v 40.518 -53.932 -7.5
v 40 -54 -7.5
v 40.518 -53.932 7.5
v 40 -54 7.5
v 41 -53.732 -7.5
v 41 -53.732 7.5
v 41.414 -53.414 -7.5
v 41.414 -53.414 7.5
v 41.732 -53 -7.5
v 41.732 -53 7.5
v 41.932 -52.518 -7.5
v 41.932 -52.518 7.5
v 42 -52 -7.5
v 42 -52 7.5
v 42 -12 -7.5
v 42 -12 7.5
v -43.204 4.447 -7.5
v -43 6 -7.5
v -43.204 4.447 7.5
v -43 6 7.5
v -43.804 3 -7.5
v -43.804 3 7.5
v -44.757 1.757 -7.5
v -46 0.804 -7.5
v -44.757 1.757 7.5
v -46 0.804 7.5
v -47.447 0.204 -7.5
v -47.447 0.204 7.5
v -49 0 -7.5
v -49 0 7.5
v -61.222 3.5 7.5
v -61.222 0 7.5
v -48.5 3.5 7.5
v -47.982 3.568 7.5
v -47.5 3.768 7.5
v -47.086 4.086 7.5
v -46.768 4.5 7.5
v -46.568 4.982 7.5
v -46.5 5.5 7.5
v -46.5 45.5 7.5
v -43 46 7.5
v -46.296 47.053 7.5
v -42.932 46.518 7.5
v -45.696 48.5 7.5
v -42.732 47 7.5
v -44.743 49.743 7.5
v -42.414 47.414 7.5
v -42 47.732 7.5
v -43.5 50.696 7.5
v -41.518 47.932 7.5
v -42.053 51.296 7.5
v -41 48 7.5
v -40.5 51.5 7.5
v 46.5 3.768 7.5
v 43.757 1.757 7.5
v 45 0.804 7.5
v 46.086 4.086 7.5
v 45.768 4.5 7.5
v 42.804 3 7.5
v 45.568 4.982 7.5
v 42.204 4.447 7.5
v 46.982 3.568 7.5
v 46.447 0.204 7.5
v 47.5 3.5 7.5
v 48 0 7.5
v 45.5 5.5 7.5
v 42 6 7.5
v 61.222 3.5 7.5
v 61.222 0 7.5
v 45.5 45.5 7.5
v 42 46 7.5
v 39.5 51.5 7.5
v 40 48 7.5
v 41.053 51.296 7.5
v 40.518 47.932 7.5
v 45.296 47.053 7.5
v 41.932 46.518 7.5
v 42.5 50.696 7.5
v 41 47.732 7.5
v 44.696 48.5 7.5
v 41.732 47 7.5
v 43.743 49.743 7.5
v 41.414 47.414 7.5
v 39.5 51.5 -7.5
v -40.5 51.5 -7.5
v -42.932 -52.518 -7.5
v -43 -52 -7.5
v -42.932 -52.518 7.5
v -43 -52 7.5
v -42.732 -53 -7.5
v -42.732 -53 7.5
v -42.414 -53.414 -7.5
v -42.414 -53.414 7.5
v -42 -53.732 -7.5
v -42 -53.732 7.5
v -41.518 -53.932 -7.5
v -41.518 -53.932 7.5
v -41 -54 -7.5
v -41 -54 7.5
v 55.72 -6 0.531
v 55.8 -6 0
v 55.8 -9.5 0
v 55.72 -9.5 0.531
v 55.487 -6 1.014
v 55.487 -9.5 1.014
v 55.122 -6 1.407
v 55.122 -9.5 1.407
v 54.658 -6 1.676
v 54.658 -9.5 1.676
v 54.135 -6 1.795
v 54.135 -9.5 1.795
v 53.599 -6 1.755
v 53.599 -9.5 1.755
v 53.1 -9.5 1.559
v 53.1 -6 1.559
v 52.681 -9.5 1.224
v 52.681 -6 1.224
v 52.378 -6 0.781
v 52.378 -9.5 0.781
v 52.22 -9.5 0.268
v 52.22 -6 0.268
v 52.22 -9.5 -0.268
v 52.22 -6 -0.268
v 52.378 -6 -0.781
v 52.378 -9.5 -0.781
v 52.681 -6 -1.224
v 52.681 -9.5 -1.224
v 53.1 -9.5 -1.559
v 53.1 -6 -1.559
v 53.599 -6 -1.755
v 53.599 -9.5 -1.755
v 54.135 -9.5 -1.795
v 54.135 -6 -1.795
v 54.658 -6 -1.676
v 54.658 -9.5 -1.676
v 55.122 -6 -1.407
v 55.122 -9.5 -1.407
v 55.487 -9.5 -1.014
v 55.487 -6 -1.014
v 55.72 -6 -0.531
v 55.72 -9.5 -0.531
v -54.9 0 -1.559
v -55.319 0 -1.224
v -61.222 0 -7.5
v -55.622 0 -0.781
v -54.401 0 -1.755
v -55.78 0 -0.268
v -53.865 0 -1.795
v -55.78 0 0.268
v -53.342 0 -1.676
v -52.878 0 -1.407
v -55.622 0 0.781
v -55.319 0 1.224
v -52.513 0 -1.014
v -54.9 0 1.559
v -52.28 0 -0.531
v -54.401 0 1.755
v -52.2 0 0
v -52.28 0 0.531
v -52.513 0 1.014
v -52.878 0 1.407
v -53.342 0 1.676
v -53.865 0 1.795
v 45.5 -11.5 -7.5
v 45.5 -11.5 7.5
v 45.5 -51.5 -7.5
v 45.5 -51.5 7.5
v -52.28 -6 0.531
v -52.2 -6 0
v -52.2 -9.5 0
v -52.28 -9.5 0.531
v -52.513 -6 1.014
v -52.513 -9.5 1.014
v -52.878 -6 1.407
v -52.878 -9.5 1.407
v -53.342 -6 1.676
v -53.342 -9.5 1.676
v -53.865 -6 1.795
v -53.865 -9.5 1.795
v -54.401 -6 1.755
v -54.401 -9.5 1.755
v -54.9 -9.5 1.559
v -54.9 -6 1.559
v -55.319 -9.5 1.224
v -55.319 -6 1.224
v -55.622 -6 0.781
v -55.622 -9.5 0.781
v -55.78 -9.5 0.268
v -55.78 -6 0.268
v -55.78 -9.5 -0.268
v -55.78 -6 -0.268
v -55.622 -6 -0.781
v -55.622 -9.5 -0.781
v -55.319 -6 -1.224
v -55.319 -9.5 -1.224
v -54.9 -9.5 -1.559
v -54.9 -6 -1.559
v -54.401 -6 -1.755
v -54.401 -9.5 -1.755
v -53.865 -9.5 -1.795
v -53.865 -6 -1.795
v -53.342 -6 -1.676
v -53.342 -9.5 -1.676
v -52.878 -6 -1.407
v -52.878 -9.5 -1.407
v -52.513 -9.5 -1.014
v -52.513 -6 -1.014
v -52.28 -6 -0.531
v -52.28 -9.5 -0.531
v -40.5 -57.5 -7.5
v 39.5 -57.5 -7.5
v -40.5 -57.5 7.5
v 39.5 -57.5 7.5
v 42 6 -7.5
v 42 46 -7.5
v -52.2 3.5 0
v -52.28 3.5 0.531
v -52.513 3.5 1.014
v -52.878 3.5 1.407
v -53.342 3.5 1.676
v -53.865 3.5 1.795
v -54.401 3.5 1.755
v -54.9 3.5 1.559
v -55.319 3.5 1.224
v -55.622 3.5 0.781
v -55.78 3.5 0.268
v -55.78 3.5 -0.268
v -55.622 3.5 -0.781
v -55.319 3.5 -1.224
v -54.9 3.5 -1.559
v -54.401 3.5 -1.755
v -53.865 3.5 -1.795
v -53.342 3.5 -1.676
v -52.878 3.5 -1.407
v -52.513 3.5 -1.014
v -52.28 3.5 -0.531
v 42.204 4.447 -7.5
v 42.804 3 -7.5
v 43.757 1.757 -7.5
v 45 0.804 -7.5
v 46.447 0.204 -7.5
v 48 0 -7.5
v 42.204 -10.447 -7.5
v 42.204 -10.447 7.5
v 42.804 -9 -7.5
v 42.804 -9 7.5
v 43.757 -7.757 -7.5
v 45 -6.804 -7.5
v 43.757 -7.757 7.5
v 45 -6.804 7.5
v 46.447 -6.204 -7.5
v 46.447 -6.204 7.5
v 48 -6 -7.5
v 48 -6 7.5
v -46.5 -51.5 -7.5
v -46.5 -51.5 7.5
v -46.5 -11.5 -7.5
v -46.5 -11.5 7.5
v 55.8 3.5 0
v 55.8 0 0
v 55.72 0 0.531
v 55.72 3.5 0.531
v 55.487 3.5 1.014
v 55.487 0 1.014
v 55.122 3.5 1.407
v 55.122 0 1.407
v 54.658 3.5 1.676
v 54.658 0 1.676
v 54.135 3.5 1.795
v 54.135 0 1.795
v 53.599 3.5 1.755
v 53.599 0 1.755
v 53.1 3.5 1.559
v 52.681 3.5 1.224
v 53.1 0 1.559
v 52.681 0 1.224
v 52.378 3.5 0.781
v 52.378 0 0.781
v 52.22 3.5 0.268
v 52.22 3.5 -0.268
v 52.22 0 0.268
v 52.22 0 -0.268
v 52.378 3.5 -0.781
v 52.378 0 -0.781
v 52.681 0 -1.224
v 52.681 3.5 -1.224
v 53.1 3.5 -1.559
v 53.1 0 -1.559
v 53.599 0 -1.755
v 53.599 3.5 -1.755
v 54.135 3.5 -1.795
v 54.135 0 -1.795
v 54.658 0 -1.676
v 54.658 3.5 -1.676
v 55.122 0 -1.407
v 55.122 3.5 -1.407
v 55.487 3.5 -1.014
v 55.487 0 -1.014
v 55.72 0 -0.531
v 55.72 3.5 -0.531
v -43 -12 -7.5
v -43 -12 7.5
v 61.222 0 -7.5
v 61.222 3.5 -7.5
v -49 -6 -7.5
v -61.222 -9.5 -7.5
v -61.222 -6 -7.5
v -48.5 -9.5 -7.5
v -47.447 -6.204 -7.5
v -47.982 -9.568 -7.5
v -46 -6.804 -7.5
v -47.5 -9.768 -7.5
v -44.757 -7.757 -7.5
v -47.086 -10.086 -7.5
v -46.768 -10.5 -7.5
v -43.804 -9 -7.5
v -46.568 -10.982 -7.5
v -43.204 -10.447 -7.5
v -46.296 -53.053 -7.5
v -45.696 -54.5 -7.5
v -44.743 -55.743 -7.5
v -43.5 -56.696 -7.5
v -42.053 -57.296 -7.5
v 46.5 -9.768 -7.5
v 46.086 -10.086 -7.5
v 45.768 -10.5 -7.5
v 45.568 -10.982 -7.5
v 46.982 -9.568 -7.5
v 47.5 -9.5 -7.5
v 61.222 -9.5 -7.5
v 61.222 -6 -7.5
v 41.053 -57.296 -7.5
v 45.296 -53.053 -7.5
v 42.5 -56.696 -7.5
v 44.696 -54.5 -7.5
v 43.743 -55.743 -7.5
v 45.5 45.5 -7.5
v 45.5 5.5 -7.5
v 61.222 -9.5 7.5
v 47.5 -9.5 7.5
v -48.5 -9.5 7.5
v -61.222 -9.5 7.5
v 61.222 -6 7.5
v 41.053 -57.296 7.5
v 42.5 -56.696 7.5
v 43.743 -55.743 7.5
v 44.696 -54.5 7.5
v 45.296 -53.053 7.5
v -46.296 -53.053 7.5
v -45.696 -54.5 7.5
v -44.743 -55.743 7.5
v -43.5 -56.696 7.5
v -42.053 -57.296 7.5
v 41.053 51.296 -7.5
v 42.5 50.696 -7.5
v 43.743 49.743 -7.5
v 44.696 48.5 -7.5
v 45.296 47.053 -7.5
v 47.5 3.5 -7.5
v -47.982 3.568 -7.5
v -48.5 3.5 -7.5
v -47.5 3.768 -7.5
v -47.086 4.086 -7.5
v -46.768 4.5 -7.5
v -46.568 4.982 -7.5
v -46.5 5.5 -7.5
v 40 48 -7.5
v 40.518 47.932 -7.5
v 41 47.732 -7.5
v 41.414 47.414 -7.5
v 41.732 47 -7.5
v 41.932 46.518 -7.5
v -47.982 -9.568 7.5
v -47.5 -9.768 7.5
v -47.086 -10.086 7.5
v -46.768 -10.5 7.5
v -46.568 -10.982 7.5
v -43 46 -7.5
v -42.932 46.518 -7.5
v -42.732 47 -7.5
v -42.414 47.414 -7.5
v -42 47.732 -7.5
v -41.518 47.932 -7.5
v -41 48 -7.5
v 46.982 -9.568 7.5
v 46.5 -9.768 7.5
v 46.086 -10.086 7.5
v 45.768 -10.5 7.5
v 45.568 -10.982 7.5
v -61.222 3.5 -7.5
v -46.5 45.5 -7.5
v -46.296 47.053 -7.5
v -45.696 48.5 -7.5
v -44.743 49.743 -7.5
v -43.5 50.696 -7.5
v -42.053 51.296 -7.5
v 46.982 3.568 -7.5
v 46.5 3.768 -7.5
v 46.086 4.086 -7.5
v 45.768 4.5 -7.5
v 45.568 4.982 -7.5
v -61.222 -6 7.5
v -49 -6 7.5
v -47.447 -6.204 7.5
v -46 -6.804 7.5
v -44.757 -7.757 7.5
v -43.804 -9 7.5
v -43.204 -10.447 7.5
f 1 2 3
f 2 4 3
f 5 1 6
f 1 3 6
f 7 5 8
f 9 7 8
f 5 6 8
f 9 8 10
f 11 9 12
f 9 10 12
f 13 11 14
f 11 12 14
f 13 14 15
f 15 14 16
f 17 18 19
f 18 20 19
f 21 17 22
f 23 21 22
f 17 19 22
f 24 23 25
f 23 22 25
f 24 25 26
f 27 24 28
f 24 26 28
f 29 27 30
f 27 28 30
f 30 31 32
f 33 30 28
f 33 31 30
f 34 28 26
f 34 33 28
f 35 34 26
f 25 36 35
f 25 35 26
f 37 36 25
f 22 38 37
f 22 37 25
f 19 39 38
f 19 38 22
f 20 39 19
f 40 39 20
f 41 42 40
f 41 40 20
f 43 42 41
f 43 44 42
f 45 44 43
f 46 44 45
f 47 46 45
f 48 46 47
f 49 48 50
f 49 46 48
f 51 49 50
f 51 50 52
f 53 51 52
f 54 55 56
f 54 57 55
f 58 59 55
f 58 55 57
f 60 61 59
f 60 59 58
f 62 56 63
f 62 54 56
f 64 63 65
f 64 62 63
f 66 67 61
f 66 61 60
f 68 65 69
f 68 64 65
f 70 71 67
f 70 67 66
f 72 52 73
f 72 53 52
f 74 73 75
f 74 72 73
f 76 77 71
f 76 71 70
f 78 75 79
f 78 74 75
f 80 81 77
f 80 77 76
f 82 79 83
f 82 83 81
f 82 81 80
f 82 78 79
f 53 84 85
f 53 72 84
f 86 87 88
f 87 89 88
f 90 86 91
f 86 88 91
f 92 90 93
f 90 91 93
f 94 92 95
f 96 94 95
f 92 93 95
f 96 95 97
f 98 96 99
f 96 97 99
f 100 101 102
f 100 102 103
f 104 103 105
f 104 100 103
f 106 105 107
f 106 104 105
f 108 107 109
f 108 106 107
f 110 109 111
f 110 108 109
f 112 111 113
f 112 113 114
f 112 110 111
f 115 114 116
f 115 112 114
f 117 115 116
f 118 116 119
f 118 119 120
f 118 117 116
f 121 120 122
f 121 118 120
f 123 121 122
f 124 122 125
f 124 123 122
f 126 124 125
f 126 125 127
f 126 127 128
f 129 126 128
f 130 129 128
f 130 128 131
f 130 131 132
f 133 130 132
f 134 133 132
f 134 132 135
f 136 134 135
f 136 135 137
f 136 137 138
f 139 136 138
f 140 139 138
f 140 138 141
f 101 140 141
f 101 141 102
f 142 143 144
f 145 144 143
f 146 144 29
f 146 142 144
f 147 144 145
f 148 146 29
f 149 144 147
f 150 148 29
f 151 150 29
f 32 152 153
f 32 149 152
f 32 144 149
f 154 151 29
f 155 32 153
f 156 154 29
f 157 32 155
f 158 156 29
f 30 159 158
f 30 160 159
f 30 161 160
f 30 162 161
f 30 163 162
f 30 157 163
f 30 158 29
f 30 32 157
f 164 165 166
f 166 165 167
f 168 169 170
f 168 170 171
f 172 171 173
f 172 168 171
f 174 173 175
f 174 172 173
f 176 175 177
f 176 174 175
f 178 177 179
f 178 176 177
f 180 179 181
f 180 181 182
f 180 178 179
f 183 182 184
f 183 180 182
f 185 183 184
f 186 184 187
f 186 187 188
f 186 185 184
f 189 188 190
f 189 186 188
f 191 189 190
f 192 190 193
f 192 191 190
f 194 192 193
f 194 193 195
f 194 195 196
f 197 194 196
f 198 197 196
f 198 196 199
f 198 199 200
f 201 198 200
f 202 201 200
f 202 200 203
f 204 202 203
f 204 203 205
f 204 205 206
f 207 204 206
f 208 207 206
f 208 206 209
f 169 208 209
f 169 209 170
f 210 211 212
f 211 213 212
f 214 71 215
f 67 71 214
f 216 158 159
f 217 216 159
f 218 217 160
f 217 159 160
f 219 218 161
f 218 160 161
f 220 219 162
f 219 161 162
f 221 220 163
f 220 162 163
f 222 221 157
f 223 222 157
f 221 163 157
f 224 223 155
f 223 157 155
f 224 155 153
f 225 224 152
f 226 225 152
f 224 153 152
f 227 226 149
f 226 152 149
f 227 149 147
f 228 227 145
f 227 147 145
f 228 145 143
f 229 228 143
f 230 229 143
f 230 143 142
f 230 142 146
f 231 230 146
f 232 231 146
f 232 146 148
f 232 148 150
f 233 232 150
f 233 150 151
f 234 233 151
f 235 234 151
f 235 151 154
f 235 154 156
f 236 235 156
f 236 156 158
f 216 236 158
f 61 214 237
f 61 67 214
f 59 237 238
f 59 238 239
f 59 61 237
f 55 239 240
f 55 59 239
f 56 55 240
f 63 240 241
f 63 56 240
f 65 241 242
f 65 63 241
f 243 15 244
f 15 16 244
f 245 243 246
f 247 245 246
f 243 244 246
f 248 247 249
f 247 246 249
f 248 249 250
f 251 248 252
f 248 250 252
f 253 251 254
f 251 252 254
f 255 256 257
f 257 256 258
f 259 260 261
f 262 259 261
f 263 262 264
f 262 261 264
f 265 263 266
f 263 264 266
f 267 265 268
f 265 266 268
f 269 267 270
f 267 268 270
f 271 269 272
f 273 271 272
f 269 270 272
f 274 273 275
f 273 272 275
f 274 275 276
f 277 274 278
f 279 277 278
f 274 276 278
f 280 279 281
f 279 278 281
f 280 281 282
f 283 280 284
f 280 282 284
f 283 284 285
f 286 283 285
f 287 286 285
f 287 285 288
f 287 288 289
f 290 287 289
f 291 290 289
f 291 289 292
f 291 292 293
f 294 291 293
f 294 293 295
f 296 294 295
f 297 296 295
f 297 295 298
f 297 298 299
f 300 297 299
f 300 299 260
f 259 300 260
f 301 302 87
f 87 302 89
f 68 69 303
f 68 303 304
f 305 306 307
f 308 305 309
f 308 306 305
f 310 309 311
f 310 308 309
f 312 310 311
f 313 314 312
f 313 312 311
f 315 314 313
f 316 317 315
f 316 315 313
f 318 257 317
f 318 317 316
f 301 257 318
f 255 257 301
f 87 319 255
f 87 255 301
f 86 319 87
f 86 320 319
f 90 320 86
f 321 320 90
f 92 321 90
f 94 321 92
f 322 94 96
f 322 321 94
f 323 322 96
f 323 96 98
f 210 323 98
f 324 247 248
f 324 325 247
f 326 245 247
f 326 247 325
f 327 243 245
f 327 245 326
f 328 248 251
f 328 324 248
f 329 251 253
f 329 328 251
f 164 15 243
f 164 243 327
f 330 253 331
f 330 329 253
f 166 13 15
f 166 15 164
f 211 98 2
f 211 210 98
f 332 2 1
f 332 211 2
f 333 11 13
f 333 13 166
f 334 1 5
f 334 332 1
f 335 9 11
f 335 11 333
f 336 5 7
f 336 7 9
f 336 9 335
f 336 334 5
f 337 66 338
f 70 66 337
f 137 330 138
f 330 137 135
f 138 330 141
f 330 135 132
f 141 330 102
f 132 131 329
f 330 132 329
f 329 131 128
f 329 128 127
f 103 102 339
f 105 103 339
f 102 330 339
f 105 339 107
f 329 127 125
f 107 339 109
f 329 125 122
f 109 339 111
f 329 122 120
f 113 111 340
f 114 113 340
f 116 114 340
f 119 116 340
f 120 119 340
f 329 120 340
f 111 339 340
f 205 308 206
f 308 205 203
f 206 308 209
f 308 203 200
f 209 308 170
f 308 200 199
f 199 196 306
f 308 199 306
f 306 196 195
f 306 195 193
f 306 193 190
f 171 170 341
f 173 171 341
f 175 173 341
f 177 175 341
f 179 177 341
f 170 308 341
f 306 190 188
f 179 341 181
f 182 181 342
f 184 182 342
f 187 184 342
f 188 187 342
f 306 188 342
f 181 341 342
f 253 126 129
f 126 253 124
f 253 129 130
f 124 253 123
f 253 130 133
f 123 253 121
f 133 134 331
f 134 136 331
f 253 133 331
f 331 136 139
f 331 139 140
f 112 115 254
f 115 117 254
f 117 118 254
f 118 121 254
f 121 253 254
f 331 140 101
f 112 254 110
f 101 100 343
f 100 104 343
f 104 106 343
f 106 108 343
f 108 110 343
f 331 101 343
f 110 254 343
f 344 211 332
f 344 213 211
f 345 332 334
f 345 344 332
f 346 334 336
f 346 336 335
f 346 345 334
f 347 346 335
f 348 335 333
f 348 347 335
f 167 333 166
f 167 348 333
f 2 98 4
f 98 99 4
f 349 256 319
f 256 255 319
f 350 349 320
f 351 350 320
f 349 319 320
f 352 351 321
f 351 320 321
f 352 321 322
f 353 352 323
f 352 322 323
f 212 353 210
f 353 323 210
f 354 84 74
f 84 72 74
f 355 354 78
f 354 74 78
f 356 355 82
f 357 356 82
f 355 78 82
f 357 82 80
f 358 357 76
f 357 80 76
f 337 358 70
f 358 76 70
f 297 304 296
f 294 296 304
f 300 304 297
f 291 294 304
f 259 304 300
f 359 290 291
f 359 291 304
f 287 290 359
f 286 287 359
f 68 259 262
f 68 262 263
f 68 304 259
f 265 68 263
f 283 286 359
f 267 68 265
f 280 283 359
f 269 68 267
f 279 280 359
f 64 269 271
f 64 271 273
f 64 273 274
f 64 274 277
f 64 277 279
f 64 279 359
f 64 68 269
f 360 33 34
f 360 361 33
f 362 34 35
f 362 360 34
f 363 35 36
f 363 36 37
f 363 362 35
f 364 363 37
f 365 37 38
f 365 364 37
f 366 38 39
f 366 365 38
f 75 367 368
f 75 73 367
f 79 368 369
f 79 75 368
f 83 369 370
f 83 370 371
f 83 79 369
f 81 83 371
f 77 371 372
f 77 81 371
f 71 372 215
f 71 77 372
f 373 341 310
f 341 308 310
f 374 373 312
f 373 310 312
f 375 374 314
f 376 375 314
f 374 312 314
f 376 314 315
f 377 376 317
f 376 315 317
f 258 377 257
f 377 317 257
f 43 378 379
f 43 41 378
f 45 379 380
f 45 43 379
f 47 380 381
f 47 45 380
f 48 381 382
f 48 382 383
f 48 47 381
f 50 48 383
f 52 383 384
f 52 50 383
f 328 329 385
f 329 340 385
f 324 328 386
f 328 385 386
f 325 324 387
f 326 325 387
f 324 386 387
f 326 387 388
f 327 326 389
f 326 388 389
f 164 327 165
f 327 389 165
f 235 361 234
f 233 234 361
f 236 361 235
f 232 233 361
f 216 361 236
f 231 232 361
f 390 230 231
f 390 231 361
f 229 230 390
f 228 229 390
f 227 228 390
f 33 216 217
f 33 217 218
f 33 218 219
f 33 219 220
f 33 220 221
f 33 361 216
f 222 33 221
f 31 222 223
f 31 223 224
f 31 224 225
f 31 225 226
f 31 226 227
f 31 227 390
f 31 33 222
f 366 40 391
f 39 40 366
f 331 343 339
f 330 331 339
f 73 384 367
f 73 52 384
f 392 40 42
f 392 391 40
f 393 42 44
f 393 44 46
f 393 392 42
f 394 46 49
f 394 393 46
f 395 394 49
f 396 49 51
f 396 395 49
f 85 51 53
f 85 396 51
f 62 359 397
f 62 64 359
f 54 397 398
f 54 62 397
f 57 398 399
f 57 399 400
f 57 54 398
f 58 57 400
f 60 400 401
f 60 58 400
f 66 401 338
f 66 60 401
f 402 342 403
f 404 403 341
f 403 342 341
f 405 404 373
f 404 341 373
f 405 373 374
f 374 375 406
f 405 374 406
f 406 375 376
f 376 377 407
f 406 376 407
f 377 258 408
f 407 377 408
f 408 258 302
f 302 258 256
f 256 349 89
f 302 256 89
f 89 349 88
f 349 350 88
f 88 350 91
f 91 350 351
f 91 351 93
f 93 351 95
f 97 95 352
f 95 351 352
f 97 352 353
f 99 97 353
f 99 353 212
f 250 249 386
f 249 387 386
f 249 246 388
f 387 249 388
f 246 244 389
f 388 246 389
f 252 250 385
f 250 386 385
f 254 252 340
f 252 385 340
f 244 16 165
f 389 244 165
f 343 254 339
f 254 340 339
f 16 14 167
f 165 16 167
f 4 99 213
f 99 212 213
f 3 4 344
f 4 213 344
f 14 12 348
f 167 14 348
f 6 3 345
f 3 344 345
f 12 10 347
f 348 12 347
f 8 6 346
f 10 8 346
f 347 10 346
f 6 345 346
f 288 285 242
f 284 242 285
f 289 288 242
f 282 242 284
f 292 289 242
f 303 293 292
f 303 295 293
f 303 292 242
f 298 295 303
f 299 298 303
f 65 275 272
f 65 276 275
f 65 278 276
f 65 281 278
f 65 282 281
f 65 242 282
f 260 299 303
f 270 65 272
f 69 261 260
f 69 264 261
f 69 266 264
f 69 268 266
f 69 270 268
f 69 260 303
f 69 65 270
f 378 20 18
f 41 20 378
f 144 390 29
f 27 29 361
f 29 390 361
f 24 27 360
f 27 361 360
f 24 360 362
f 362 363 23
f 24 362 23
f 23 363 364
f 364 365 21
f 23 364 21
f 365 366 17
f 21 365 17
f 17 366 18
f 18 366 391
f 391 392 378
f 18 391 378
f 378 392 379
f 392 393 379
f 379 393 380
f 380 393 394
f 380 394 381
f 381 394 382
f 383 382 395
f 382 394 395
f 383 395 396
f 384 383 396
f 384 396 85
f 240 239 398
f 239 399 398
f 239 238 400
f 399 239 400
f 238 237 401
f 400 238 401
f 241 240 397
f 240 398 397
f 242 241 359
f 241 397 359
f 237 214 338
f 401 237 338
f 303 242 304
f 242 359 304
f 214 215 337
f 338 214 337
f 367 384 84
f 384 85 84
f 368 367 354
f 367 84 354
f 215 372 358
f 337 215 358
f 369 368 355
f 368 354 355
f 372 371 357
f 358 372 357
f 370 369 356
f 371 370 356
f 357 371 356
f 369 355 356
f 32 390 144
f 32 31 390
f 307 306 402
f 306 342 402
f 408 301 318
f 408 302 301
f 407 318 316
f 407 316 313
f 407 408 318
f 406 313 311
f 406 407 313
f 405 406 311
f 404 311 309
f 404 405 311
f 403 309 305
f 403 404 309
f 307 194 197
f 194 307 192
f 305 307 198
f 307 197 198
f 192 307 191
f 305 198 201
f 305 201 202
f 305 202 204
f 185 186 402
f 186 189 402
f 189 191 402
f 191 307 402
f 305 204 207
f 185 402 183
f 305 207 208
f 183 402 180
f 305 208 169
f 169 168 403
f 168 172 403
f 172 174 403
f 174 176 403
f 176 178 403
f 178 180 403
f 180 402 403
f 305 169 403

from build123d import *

# Parameters (mm, degrees)
F1_DEPTH = 7.5
F3_D     = 3.6
F4_R     = 2
F5_R     = 6


with BuildPart() as f1:
    # F0 (on Top) → F1 (new body, symmetric)
    with BuildSketch(Plane.XY):
        Polygon((-61.2221807241, 3.5), (-61.2221807241, 0), (-43, 0), (-43, 48), (42, 48), (42, 0), (61.2221807241, 0), (61.2221807241, 3.5), (45.5, 3.5), (45.5, 51.5), (-46.5, 51.5), (-46.5, 3.5), align=None)
    extrude(amount=F1_DEPTH, both=True)

    # F3 (through all)
    with Locations(Plane(origin=(0, 3.5, 0), x_dir=(-1, 0, 0), z_dir=(0, 1, 0))):
        with Locations((54, 0), (-54, 0)):
            Hole(F3_D / 2)

    # F4
    f4_edges = [f1.edges().sort_by_distance(p)[0] for p in [
        (42, 48, 0),
        (-43, 48, 0),
        (-46.5, 3.5, 0),
        (45.5, 3.5, 0),
    ]]
    fillet(f4_edges, radius=F4_R)

    # F5
    f5_edges = [f1.edges().sort_by_distance(p)[0] for p in [
        (45.5, 51.5, 0),
        (-46.5, 51.5, 0),
        (42, 0, 0),
        (-43, 0, 0),
    ]]
    fillet(f5_edges, radius=F5_R)


with BuildPart() as f8_1:
    # F8: instance of F1
    add(f1.part.mirror(Plane.XZ.offset(3)))


solid = Compound([f1.part, f8_1.part])
